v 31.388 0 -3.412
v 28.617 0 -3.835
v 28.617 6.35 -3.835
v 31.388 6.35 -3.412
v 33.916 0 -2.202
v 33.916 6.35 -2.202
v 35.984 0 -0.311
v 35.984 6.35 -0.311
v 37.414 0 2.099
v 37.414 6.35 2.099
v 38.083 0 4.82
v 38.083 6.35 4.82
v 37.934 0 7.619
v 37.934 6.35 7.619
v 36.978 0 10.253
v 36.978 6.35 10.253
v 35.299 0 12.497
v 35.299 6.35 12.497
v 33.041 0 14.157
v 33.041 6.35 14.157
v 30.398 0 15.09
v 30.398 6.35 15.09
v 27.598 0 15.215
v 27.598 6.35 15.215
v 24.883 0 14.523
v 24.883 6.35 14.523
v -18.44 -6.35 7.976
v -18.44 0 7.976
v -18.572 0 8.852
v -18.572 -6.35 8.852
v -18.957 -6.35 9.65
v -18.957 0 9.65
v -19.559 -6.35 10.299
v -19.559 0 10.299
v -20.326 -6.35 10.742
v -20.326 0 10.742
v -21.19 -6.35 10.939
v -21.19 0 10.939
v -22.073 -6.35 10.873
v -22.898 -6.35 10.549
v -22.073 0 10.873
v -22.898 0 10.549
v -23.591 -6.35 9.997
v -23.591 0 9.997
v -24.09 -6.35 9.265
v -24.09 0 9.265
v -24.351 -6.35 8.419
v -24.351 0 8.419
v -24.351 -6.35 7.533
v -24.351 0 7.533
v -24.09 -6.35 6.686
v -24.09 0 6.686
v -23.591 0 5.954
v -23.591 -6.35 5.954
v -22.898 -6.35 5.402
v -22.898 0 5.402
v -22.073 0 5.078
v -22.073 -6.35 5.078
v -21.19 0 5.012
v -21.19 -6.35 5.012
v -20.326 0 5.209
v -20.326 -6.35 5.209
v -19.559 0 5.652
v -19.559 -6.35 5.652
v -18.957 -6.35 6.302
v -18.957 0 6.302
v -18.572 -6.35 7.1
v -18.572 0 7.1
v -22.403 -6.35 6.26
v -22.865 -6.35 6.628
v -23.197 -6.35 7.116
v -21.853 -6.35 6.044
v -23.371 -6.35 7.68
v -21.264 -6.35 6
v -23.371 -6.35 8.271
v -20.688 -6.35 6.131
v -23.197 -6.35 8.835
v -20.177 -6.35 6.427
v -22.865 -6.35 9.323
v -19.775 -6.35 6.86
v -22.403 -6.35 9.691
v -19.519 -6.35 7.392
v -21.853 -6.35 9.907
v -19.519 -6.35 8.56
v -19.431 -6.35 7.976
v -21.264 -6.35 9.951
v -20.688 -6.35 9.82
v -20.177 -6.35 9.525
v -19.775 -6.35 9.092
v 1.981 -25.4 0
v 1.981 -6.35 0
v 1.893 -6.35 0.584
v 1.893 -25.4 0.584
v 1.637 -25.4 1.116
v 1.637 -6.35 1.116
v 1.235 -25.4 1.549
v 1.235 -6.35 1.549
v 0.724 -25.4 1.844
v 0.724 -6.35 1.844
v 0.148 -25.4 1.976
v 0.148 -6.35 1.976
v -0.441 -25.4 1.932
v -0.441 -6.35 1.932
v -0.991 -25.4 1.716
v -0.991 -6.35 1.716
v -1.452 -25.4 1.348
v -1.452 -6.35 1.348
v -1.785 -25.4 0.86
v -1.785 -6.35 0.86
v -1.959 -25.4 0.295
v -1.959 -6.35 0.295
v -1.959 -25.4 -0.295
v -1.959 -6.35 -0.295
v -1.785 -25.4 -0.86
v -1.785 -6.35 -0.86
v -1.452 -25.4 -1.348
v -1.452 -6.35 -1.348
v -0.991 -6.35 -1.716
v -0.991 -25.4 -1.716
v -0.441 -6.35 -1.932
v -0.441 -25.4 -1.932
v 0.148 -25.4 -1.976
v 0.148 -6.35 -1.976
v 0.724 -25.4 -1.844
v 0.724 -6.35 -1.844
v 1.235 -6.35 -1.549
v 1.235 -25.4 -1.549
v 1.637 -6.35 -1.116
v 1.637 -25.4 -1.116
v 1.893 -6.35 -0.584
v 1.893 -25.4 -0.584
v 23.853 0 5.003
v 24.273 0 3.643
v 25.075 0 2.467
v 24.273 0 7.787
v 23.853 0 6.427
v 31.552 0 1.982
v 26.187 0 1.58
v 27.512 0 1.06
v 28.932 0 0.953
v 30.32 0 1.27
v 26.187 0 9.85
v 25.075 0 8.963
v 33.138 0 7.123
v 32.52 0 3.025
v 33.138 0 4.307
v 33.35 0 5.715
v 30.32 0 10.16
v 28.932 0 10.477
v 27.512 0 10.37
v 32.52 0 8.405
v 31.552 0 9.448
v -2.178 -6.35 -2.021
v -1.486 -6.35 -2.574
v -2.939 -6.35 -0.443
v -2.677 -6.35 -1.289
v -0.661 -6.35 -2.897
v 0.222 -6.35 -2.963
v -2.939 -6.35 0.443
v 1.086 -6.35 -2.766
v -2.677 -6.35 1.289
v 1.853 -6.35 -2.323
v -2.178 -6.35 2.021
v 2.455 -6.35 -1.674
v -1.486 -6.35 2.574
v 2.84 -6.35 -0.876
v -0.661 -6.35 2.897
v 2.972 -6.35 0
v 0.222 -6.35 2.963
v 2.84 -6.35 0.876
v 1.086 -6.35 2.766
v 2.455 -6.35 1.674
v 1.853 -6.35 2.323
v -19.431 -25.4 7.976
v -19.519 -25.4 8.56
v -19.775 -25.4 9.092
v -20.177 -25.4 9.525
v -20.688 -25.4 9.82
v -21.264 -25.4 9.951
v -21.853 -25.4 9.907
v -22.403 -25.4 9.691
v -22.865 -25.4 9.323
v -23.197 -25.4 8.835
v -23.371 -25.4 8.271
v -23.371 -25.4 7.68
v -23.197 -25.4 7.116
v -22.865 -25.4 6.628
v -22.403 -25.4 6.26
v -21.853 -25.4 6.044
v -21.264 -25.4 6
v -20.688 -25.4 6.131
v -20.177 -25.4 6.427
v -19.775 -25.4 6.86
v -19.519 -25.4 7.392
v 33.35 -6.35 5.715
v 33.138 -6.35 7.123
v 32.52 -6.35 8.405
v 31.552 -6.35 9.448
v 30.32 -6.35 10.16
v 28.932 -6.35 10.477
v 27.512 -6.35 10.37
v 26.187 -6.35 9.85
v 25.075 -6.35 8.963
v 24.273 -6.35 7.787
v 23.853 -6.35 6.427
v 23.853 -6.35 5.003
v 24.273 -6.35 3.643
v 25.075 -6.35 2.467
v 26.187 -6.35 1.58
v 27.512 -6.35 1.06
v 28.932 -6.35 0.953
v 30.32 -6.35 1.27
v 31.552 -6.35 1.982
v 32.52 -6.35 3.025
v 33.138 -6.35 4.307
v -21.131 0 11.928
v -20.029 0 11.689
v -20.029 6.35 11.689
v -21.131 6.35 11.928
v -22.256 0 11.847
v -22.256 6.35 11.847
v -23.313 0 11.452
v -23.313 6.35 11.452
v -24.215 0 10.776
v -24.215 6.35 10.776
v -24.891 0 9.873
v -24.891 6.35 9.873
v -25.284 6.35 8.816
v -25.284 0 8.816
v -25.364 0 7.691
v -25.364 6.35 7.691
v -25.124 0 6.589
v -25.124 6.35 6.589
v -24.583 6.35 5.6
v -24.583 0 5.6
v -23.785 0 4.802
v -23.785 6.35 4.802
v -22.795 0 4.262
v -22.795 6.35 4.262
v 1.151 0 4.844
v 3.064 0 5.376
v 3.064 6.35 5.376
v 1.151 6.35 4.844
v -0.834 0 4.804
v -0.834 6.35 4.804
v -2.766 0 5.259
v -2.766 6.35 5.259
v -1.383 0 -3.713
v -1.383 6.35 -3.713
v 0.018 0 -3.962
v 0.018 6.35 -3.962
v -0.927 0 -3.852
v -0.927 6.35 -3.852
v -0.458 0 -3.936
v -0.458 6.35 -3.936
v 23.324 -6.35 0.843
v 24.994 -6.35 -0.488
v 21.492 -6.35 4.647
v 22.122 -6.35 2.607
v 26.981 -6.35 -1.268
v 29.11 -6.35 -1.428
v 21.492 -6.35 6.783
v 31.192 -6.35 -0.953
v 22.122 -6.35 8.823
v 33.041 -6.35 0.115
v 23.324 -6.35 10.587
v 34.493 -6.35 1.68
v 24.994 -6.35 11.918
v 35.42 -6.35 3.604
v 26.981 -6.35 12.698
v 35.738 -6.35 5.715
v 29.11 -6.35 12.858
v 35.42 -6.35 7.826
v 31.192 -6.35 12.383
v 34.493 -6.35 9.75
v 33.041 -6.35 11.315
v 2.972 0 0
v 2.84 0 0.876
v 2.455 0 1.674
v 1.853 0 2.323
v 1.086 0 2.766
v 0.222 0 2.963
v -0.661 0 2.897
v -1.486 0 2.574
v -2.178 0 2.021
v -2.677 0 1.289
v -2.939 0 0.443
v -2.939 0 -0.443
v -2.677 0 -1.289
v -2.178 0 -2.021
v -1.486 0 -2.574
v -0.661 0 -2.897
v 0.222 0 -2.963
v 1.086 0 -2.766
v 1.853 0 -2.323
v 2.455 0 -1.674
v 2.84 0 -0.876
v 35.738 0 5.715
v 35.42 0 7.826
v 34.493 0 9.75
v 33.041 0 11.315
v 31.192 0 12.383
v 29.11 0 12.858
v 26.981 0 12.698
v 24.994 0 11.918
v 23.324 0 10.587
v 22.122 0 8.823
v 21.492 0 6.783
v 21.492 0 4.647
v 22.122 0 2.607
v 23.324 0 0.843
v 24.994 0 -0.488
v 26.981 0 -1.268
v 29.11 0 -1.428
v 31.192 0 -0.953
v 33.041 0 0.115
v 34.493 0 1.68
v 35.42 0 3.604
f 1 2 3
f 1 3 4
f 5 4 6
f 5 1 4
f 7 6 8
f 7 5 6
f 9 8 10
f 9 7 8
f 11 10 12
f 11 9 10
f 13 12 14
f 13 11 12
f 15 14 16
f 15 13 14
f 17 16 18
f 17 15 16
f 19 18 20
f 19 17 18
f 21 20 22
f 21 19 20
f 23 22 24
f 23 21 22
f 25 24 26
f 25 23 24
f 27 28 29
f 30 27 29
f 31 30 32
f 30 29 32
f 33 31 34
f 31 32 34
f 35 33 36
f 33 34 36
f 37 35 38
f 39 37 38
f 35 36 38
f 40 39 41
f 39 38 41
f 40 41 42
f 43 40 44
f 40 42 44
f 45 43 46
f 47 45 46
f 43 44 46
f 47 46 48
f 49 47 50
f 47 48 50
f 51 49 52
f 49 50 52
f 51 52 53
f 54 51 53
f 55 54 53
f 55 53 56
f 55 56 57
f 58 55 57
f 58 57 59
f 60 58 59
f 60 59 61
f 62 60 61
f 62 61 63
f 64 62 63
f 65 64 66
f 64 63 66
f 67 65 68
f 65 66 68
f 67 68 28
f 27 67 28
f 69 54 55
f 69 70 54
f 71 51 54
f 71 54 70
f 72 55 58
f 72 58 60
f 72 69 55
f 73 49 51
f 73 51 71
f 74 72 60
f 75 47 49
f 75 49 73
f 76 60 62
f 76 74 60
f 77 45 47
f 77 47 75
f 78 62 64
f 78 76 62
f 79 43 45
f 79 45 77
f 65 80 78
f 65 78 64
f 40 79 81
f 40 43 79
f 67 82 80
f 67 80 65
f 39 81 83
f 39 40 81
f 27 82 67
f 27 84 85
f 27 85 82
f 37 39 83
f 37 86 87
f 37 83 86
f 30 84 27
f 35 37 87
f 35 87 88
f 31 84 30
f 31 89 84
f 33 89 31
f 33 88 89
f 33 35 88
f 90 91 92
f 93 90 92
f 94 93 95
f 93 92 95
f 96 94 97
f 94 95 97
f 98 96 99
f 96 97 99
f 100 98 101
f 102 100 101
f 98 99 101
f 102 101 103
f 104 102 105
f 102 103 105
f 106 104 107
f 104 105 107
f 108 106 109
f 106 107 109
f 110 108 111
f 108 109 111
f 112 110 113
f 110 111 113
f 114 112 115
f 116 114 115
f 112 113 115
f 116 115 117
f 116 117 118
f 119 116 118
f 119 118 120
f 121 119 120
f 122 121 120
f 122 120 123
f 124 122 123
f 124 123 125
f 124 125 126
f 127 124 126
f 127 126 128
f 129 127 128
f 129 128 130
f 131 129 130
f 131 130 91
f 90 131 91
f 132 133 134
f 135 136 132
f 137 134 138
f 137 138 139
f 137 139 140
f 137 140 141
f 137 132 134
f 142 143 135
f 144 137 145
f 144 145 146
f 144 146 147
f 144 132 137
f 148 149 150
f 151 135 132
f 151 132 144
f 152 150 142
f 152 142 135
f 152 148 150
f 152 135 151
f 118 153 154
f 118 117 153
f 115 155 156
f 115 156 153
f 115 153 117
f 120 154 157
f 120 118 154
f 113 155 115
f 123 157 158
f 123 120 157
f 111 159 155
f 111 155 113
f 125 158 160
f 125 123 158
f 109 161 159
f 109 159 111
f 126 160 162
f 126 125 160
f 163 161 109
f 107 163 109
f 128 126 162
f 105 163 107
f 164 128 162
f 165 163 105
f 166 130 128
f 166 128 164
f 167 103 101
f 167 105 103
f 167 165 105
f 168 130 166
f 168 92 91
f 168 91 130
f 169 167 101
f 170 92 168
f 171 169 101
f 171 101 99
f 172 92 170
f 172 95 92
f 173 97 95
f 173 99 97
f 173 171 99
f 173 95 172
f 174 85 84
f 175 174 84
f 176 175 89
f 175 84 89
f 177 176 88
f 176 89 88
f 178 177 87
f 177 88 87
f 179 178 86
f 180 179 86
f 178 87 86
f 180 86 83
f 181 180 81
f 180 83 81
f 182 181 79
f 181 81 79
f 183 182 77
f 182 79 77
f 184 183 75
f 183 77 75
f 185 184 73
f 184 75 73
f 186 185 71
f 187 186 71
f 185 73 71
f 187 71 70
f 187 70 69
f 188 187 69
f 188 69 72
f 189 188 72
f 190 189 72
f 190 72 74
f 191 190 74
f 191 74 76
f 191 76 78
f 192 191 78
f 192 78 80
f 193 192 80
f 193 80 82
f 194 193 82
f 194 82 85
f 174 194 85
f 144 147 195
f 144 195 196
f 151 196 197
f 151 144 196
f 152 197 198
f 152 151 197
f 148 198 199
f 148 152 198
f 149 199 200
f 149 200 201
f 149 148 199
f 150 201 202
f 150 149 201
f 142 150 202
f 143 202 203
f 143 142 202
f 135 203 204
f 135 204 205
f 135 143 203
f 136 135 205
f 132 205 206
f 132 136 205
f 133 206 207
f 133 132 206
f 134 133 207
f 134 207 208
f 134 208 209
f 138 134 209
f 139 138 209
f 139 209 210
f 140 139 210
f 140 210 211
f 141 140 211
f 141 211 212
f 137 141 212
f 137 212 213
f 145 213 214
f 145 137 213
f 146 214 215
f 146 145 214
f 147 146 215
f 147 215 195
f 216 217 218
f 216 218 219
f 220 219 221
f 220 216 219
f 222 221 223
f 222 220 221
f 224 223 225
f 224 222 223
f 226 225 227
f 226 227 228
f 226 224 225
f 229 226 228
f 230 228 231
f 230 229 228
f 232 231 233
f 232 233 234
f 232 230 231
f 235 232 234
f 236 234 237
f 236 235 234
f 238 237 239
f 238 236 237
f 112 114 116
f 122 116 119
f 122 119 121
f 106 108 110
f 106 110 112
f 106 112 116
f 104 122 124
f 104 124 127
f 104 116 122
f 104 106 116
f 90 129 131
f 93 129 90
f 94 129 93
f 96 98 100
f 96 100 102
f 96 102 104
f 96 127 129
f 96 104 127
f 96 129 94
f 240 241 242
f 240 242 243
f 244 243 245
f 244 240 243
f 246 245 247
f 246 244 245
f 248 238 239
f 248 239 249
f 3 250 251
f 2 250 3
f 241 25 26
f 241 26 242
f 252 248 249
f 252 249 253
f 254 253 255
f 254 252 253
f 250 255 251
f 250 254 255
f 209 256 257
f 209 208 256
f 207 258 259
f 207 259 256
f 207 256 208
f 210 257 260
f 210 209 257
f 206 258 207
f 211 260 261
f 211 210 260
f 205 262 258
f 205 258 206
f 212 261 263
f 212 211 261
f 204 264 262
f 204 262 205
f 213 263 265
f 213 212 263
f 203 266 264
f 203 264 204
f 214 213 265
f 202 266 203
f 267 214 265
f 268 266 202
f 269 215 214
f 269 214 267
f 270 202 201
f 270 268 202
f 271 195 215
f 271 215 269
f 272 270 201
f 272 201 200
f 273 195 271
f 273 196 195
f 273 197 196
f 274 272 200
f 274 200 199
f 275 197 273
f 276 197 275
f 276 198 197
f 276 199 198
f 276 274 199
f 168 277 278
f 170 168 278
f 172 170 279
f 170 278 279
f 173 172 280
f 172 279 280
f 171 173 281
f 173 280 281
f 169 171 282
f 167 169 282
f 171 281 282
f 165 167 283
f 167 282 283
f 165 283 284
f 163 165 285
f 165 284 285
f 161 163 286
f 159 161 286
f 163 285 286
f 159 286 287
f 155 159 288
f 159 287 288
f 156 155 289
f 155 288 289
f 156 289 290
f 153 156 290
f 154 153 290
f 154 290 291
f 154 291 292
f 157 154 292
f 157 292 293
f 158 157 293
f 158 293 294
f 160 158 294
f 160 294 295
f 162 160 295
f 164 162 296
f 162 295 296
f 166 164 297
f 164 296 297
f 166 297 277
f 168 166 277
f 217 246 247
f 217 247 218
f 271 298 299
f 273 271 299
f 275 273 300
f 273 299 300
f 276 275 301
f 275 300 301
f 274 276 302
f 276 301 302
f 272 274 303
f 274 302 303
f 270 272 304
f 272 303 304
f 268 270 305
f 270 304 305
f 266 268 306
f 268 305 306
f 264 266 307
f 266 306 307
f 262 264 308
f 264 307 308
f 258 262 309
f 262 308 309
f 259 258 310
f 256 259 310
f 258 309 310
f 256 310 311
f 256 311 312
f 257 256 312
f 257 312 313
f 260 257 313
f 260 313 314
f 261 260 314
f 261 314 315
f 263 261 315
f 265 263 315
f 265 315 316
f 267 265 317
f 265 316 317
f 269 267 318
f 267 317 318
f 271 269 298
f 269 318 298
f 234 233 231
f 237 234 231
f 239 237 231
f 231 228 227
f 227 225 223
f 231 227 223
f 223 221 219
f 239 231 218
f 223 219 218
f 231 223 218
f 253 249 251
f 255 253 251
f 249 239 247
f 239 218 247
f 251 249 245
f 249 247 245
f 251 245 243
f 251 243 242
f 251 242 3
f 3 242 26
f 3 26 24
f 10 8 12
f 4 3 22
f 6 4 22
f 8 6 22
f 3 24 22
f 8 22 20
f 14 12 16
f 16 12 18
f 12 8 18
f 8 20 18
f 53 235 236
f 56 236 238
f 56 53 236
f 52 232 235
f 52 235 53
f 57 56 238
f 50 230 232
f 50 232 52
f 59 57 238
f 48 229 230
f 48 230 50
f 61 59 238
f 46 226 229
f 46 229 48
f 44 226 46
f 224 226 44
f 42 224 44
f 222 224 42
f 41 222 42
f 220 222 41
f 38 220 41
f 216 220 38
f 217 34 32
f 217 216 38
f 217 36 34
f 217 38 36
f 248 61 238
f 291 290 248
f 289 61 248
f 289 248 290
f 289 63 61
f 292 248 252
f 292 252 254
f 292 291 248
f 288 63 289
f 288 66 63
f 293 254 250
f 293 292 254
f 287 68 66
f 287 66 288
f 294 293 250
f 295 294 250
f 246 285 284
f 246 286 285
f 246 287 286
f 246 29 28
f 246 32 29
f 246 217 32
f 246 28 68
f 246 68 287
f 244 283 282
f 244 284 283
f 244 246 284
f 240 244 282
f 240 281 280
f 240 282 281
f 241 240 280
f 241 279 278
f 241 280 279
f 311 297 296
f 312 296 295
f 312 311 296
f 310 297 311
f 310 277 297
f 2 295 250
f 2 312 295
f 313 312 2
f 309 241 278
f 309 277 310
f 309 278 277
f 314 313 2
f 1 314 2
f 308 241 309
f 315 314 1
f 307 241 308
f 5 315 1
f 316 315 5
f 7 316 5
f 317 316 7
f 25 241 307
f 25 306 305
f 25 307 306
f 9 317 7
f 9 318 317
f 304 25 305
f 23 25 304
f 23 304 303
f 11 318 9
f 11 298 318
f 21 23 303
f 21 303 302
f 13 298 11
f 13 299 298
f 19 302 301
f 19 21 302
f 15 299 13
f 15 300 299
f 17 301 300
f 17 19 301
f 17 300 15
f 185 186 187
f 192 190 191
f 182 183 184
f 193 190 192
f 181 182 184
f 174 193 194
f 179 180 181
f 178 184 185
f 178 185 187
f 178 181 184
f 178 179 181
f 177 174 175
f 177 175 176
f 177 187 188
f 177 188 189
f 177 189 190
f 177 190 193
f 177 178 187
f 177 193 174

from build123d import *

# Parameters (mm, degrees)
F0_R     = 2.9718
F0_R_2   = 7.1628
F0_R_3   = 1.9812
F0_R_4   = 4.7752
F1_DEPTH = 6.35
F2_DEPTH = 6.35
F3_DEPTH = 25.4


with BuildPart() as f1:
    # F0 (on Front) → F1 (new body)
    with BuildSketch(Plane.XZ):
        with BuildLine():
            Line((-2.766164, 5.258687), (-20.029118, 11.688779))
            ThreePointArc((-20.029118, 11.688779), (-25.125379, 9.358682), (-22.795282, 4.262421))
            Line((-22.795282, 4.262421), (-1.383082, -3.713179))
            ThreePointArc((-1.383082, -3.713179), (-0.694015, -3.901148), (0.017603, -3.962361))
            Line((0.017603, -3.962361), (28.617427, -3.835306))
            ThreePointArc((28.617427, -3.835306), (37.933712, 7.618851), (24.882816, 14.522833))
            Line((24.882816, 14.522833), (3.063727, 5.376418))
            ThreePointArc((3.063727, 5.376418), (0.160003, 4.76186), (-2.766164, 5.258687))
        make_face()
        Circle(F0_R, mode=Mode.SUBTRACT)
        with Locations((-21.4122, 7.9756)):
            Circle(F0_R, mode=Mode.SUBTRACT)
        with Locations((28.575, 5.715)):
            Circle(F0_R_2, mode=Mode.SUBTRACT)
        with Locations((-21.4122, 7.9756)):
            Circle(F0_R)
        with Locations((-21.4122, 7.9756)):
            Circle(F0_R_3, mode=Mode.SUBTRACT)
        with Locations((-21.4122, 7.9756)):
            Circle(F0_R_3)
        Circle(F0_R)
        Circle(F0_R_3, mode=Mode.SUBTRACT)
        Circle(F0_R_3)
        with Locations((28.575, 5.715)):
            Circle(F0_R_2)
        with Locations((28.575, 5.715)):
            Circle(F0_R_4, mode=Mode.SUBTRACT)
        with Locations((28.575, 5.715)):
            Circle(F0_R_4)
    extrude(amount=-F1_DEPTH)

    # F0 (on Front) → F2 (join)
    with BuildSketch(Plane.XZ):
        with Locations((-21.4122, 7.9756)):
            Circle(F0_R)
        with Locations((-21.4122, 7.9756)):
            Circle(F0_R_3, mode=Mode.SUBTRACT)
        Circle(F0_R)
        Circle(F0_R_3, mode=Mode.SUBTRACT)
        with Locations((28.575, 5.715)):
            Circle(F0_R_2)
        with Locations((28.575, 5.715)):
            Circle(F0_R_4, mode=Mode.SUBTRACT)
    extrude(amount=F2_DEPTH)

    # F0 (on Front) → F3 (join)
    with BuildSketch(Plane.XZ):
        with Locations((-21.4122, 7.9756)):
            Circle(F0_R_3)
        Circle(F0_R_3)
    extrude(amount=F3_DEPTH)


solid = f1.part
